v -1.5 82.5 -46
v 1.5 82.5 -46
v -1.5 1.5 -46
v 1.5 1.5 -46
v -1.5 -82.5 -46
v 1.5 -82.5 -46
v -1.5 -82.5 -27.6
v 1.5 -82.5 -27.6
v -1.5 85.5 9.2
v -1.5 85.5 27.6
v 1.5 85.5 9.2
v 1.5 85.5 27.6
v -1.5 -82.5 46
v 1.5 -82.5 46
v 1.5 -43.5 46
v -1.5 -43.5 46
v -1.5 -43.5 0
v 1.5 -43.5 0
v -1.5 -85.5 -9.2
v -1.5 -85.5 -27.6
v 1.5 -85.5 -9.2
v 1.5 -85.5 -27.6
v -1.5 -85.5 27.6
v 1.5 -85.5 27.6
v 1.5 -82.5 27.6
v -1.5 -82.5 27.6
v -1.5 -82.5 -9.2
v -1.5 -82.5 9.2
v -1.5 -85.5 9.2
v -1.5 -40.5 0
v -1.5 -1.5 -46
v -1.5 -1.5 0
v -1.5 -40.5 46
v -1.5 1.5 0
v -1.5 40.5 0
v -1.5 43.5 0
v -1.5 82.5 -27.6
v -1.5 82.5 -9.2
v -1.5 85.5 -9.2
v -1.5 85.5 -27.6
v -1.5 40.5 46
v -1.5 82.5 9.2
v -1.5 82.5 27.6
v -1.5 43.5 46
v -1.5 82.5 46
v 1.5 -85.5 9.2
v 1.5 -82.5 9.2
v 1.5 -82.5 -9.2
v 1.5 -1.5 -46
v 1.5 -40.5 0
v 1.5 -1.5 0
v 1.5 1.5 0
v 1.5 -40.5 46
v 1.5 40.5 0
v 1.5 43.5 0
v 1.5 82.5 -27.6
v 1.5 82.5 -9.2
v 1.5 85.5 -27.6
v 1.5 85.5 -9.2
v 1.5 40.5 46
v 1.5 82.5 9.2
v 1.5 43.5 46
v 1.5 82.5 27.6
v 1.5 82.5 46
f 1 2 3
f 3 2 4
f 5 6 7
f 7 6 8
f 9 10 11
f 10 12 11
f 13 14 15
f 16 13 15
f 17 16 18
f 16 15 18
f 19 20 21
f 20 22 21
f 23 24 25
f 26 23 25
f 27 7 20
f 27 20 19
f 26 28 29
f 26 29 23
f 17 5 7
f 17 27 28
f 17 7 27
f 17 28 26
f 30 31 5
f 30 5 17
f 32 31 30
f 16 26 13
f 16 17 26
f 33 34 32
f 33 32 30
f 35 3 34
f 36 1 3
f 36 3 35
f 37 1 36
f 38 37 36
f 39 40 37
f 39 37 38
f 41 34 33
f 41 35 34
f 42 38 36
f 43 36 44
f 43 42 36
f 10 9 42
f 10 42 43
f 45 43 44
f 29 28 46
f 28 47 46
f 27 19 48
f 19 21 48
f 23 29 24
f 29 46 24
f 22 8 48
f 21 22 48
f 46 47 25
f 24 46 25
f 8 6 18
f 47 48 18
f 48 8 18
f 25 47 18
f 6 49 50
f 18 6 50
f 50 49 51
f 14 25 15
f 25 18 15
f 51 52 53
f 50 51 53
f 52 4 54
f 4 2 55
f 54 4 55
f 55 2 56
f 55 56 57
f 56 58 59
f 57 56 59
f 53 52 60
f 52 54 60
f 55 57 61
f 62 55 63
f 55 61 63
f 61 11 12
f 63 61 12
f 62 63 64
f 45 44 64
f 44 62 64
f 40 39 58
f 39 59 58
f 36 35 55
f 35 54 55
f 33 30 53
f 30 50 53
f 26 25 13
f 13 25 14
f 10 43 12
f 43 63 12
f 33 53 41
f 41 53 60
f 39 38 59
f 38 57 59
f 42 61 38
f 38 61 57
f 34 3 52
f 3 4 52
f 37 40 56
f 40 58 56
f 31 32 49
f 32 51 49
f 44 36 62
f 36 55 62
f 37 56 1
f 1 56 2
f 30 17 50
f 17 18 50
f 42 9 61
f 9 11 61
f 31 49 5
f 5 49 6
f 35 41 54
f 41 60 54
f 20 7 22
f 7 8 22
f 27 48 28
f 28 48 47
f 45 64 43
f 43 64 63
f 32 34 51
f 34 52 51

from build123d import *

# Parameters (mm, degrees)
ESTRUSIONE_ESTRUSIONE1_DEPTH = 1.5


with BuildPart() as part:
    # Schizzo1 → Estrusione-Estrusione1 (new body, symmetric)
    with BuildSketch(Plane(origin=(0, 0, 0), x_dir=(0, 0, -1), z_dir=(1, 0, 0))):
        Polygon((-46, -82.5), (-46, -43.5), (0, -43.5), (0, -40.5), (-46, -40.5), (-46, 40.5), (0, 40.5), (0, 43.5), (-46, 43.5), (-46, 82.5), (-27.6, 82.5), (-27.6, 85.5), (-9.2, 85.5), (-9.2, 82.5), (9.2, 82.5), (9.2, 85.5), (27.6, 85.5), (27.6, 82.5), (46, 82.5), (46, 1.5), (0, 1.5), (0, -1.5), (46, -1.5), (46, -82.5), (27.6, -82.5), (27.6, -85.5), (9.2, -85.5), (9.2, -82.5), (-9.2, -82.5), (-9.2, -85.5), (-27.6, -85.5), (-27.6, -82.5), align=None)
    extrude(amount=ESTRUSIONE_ESTRUSIONE1_DEPTH, both=True)


solid = part.part
